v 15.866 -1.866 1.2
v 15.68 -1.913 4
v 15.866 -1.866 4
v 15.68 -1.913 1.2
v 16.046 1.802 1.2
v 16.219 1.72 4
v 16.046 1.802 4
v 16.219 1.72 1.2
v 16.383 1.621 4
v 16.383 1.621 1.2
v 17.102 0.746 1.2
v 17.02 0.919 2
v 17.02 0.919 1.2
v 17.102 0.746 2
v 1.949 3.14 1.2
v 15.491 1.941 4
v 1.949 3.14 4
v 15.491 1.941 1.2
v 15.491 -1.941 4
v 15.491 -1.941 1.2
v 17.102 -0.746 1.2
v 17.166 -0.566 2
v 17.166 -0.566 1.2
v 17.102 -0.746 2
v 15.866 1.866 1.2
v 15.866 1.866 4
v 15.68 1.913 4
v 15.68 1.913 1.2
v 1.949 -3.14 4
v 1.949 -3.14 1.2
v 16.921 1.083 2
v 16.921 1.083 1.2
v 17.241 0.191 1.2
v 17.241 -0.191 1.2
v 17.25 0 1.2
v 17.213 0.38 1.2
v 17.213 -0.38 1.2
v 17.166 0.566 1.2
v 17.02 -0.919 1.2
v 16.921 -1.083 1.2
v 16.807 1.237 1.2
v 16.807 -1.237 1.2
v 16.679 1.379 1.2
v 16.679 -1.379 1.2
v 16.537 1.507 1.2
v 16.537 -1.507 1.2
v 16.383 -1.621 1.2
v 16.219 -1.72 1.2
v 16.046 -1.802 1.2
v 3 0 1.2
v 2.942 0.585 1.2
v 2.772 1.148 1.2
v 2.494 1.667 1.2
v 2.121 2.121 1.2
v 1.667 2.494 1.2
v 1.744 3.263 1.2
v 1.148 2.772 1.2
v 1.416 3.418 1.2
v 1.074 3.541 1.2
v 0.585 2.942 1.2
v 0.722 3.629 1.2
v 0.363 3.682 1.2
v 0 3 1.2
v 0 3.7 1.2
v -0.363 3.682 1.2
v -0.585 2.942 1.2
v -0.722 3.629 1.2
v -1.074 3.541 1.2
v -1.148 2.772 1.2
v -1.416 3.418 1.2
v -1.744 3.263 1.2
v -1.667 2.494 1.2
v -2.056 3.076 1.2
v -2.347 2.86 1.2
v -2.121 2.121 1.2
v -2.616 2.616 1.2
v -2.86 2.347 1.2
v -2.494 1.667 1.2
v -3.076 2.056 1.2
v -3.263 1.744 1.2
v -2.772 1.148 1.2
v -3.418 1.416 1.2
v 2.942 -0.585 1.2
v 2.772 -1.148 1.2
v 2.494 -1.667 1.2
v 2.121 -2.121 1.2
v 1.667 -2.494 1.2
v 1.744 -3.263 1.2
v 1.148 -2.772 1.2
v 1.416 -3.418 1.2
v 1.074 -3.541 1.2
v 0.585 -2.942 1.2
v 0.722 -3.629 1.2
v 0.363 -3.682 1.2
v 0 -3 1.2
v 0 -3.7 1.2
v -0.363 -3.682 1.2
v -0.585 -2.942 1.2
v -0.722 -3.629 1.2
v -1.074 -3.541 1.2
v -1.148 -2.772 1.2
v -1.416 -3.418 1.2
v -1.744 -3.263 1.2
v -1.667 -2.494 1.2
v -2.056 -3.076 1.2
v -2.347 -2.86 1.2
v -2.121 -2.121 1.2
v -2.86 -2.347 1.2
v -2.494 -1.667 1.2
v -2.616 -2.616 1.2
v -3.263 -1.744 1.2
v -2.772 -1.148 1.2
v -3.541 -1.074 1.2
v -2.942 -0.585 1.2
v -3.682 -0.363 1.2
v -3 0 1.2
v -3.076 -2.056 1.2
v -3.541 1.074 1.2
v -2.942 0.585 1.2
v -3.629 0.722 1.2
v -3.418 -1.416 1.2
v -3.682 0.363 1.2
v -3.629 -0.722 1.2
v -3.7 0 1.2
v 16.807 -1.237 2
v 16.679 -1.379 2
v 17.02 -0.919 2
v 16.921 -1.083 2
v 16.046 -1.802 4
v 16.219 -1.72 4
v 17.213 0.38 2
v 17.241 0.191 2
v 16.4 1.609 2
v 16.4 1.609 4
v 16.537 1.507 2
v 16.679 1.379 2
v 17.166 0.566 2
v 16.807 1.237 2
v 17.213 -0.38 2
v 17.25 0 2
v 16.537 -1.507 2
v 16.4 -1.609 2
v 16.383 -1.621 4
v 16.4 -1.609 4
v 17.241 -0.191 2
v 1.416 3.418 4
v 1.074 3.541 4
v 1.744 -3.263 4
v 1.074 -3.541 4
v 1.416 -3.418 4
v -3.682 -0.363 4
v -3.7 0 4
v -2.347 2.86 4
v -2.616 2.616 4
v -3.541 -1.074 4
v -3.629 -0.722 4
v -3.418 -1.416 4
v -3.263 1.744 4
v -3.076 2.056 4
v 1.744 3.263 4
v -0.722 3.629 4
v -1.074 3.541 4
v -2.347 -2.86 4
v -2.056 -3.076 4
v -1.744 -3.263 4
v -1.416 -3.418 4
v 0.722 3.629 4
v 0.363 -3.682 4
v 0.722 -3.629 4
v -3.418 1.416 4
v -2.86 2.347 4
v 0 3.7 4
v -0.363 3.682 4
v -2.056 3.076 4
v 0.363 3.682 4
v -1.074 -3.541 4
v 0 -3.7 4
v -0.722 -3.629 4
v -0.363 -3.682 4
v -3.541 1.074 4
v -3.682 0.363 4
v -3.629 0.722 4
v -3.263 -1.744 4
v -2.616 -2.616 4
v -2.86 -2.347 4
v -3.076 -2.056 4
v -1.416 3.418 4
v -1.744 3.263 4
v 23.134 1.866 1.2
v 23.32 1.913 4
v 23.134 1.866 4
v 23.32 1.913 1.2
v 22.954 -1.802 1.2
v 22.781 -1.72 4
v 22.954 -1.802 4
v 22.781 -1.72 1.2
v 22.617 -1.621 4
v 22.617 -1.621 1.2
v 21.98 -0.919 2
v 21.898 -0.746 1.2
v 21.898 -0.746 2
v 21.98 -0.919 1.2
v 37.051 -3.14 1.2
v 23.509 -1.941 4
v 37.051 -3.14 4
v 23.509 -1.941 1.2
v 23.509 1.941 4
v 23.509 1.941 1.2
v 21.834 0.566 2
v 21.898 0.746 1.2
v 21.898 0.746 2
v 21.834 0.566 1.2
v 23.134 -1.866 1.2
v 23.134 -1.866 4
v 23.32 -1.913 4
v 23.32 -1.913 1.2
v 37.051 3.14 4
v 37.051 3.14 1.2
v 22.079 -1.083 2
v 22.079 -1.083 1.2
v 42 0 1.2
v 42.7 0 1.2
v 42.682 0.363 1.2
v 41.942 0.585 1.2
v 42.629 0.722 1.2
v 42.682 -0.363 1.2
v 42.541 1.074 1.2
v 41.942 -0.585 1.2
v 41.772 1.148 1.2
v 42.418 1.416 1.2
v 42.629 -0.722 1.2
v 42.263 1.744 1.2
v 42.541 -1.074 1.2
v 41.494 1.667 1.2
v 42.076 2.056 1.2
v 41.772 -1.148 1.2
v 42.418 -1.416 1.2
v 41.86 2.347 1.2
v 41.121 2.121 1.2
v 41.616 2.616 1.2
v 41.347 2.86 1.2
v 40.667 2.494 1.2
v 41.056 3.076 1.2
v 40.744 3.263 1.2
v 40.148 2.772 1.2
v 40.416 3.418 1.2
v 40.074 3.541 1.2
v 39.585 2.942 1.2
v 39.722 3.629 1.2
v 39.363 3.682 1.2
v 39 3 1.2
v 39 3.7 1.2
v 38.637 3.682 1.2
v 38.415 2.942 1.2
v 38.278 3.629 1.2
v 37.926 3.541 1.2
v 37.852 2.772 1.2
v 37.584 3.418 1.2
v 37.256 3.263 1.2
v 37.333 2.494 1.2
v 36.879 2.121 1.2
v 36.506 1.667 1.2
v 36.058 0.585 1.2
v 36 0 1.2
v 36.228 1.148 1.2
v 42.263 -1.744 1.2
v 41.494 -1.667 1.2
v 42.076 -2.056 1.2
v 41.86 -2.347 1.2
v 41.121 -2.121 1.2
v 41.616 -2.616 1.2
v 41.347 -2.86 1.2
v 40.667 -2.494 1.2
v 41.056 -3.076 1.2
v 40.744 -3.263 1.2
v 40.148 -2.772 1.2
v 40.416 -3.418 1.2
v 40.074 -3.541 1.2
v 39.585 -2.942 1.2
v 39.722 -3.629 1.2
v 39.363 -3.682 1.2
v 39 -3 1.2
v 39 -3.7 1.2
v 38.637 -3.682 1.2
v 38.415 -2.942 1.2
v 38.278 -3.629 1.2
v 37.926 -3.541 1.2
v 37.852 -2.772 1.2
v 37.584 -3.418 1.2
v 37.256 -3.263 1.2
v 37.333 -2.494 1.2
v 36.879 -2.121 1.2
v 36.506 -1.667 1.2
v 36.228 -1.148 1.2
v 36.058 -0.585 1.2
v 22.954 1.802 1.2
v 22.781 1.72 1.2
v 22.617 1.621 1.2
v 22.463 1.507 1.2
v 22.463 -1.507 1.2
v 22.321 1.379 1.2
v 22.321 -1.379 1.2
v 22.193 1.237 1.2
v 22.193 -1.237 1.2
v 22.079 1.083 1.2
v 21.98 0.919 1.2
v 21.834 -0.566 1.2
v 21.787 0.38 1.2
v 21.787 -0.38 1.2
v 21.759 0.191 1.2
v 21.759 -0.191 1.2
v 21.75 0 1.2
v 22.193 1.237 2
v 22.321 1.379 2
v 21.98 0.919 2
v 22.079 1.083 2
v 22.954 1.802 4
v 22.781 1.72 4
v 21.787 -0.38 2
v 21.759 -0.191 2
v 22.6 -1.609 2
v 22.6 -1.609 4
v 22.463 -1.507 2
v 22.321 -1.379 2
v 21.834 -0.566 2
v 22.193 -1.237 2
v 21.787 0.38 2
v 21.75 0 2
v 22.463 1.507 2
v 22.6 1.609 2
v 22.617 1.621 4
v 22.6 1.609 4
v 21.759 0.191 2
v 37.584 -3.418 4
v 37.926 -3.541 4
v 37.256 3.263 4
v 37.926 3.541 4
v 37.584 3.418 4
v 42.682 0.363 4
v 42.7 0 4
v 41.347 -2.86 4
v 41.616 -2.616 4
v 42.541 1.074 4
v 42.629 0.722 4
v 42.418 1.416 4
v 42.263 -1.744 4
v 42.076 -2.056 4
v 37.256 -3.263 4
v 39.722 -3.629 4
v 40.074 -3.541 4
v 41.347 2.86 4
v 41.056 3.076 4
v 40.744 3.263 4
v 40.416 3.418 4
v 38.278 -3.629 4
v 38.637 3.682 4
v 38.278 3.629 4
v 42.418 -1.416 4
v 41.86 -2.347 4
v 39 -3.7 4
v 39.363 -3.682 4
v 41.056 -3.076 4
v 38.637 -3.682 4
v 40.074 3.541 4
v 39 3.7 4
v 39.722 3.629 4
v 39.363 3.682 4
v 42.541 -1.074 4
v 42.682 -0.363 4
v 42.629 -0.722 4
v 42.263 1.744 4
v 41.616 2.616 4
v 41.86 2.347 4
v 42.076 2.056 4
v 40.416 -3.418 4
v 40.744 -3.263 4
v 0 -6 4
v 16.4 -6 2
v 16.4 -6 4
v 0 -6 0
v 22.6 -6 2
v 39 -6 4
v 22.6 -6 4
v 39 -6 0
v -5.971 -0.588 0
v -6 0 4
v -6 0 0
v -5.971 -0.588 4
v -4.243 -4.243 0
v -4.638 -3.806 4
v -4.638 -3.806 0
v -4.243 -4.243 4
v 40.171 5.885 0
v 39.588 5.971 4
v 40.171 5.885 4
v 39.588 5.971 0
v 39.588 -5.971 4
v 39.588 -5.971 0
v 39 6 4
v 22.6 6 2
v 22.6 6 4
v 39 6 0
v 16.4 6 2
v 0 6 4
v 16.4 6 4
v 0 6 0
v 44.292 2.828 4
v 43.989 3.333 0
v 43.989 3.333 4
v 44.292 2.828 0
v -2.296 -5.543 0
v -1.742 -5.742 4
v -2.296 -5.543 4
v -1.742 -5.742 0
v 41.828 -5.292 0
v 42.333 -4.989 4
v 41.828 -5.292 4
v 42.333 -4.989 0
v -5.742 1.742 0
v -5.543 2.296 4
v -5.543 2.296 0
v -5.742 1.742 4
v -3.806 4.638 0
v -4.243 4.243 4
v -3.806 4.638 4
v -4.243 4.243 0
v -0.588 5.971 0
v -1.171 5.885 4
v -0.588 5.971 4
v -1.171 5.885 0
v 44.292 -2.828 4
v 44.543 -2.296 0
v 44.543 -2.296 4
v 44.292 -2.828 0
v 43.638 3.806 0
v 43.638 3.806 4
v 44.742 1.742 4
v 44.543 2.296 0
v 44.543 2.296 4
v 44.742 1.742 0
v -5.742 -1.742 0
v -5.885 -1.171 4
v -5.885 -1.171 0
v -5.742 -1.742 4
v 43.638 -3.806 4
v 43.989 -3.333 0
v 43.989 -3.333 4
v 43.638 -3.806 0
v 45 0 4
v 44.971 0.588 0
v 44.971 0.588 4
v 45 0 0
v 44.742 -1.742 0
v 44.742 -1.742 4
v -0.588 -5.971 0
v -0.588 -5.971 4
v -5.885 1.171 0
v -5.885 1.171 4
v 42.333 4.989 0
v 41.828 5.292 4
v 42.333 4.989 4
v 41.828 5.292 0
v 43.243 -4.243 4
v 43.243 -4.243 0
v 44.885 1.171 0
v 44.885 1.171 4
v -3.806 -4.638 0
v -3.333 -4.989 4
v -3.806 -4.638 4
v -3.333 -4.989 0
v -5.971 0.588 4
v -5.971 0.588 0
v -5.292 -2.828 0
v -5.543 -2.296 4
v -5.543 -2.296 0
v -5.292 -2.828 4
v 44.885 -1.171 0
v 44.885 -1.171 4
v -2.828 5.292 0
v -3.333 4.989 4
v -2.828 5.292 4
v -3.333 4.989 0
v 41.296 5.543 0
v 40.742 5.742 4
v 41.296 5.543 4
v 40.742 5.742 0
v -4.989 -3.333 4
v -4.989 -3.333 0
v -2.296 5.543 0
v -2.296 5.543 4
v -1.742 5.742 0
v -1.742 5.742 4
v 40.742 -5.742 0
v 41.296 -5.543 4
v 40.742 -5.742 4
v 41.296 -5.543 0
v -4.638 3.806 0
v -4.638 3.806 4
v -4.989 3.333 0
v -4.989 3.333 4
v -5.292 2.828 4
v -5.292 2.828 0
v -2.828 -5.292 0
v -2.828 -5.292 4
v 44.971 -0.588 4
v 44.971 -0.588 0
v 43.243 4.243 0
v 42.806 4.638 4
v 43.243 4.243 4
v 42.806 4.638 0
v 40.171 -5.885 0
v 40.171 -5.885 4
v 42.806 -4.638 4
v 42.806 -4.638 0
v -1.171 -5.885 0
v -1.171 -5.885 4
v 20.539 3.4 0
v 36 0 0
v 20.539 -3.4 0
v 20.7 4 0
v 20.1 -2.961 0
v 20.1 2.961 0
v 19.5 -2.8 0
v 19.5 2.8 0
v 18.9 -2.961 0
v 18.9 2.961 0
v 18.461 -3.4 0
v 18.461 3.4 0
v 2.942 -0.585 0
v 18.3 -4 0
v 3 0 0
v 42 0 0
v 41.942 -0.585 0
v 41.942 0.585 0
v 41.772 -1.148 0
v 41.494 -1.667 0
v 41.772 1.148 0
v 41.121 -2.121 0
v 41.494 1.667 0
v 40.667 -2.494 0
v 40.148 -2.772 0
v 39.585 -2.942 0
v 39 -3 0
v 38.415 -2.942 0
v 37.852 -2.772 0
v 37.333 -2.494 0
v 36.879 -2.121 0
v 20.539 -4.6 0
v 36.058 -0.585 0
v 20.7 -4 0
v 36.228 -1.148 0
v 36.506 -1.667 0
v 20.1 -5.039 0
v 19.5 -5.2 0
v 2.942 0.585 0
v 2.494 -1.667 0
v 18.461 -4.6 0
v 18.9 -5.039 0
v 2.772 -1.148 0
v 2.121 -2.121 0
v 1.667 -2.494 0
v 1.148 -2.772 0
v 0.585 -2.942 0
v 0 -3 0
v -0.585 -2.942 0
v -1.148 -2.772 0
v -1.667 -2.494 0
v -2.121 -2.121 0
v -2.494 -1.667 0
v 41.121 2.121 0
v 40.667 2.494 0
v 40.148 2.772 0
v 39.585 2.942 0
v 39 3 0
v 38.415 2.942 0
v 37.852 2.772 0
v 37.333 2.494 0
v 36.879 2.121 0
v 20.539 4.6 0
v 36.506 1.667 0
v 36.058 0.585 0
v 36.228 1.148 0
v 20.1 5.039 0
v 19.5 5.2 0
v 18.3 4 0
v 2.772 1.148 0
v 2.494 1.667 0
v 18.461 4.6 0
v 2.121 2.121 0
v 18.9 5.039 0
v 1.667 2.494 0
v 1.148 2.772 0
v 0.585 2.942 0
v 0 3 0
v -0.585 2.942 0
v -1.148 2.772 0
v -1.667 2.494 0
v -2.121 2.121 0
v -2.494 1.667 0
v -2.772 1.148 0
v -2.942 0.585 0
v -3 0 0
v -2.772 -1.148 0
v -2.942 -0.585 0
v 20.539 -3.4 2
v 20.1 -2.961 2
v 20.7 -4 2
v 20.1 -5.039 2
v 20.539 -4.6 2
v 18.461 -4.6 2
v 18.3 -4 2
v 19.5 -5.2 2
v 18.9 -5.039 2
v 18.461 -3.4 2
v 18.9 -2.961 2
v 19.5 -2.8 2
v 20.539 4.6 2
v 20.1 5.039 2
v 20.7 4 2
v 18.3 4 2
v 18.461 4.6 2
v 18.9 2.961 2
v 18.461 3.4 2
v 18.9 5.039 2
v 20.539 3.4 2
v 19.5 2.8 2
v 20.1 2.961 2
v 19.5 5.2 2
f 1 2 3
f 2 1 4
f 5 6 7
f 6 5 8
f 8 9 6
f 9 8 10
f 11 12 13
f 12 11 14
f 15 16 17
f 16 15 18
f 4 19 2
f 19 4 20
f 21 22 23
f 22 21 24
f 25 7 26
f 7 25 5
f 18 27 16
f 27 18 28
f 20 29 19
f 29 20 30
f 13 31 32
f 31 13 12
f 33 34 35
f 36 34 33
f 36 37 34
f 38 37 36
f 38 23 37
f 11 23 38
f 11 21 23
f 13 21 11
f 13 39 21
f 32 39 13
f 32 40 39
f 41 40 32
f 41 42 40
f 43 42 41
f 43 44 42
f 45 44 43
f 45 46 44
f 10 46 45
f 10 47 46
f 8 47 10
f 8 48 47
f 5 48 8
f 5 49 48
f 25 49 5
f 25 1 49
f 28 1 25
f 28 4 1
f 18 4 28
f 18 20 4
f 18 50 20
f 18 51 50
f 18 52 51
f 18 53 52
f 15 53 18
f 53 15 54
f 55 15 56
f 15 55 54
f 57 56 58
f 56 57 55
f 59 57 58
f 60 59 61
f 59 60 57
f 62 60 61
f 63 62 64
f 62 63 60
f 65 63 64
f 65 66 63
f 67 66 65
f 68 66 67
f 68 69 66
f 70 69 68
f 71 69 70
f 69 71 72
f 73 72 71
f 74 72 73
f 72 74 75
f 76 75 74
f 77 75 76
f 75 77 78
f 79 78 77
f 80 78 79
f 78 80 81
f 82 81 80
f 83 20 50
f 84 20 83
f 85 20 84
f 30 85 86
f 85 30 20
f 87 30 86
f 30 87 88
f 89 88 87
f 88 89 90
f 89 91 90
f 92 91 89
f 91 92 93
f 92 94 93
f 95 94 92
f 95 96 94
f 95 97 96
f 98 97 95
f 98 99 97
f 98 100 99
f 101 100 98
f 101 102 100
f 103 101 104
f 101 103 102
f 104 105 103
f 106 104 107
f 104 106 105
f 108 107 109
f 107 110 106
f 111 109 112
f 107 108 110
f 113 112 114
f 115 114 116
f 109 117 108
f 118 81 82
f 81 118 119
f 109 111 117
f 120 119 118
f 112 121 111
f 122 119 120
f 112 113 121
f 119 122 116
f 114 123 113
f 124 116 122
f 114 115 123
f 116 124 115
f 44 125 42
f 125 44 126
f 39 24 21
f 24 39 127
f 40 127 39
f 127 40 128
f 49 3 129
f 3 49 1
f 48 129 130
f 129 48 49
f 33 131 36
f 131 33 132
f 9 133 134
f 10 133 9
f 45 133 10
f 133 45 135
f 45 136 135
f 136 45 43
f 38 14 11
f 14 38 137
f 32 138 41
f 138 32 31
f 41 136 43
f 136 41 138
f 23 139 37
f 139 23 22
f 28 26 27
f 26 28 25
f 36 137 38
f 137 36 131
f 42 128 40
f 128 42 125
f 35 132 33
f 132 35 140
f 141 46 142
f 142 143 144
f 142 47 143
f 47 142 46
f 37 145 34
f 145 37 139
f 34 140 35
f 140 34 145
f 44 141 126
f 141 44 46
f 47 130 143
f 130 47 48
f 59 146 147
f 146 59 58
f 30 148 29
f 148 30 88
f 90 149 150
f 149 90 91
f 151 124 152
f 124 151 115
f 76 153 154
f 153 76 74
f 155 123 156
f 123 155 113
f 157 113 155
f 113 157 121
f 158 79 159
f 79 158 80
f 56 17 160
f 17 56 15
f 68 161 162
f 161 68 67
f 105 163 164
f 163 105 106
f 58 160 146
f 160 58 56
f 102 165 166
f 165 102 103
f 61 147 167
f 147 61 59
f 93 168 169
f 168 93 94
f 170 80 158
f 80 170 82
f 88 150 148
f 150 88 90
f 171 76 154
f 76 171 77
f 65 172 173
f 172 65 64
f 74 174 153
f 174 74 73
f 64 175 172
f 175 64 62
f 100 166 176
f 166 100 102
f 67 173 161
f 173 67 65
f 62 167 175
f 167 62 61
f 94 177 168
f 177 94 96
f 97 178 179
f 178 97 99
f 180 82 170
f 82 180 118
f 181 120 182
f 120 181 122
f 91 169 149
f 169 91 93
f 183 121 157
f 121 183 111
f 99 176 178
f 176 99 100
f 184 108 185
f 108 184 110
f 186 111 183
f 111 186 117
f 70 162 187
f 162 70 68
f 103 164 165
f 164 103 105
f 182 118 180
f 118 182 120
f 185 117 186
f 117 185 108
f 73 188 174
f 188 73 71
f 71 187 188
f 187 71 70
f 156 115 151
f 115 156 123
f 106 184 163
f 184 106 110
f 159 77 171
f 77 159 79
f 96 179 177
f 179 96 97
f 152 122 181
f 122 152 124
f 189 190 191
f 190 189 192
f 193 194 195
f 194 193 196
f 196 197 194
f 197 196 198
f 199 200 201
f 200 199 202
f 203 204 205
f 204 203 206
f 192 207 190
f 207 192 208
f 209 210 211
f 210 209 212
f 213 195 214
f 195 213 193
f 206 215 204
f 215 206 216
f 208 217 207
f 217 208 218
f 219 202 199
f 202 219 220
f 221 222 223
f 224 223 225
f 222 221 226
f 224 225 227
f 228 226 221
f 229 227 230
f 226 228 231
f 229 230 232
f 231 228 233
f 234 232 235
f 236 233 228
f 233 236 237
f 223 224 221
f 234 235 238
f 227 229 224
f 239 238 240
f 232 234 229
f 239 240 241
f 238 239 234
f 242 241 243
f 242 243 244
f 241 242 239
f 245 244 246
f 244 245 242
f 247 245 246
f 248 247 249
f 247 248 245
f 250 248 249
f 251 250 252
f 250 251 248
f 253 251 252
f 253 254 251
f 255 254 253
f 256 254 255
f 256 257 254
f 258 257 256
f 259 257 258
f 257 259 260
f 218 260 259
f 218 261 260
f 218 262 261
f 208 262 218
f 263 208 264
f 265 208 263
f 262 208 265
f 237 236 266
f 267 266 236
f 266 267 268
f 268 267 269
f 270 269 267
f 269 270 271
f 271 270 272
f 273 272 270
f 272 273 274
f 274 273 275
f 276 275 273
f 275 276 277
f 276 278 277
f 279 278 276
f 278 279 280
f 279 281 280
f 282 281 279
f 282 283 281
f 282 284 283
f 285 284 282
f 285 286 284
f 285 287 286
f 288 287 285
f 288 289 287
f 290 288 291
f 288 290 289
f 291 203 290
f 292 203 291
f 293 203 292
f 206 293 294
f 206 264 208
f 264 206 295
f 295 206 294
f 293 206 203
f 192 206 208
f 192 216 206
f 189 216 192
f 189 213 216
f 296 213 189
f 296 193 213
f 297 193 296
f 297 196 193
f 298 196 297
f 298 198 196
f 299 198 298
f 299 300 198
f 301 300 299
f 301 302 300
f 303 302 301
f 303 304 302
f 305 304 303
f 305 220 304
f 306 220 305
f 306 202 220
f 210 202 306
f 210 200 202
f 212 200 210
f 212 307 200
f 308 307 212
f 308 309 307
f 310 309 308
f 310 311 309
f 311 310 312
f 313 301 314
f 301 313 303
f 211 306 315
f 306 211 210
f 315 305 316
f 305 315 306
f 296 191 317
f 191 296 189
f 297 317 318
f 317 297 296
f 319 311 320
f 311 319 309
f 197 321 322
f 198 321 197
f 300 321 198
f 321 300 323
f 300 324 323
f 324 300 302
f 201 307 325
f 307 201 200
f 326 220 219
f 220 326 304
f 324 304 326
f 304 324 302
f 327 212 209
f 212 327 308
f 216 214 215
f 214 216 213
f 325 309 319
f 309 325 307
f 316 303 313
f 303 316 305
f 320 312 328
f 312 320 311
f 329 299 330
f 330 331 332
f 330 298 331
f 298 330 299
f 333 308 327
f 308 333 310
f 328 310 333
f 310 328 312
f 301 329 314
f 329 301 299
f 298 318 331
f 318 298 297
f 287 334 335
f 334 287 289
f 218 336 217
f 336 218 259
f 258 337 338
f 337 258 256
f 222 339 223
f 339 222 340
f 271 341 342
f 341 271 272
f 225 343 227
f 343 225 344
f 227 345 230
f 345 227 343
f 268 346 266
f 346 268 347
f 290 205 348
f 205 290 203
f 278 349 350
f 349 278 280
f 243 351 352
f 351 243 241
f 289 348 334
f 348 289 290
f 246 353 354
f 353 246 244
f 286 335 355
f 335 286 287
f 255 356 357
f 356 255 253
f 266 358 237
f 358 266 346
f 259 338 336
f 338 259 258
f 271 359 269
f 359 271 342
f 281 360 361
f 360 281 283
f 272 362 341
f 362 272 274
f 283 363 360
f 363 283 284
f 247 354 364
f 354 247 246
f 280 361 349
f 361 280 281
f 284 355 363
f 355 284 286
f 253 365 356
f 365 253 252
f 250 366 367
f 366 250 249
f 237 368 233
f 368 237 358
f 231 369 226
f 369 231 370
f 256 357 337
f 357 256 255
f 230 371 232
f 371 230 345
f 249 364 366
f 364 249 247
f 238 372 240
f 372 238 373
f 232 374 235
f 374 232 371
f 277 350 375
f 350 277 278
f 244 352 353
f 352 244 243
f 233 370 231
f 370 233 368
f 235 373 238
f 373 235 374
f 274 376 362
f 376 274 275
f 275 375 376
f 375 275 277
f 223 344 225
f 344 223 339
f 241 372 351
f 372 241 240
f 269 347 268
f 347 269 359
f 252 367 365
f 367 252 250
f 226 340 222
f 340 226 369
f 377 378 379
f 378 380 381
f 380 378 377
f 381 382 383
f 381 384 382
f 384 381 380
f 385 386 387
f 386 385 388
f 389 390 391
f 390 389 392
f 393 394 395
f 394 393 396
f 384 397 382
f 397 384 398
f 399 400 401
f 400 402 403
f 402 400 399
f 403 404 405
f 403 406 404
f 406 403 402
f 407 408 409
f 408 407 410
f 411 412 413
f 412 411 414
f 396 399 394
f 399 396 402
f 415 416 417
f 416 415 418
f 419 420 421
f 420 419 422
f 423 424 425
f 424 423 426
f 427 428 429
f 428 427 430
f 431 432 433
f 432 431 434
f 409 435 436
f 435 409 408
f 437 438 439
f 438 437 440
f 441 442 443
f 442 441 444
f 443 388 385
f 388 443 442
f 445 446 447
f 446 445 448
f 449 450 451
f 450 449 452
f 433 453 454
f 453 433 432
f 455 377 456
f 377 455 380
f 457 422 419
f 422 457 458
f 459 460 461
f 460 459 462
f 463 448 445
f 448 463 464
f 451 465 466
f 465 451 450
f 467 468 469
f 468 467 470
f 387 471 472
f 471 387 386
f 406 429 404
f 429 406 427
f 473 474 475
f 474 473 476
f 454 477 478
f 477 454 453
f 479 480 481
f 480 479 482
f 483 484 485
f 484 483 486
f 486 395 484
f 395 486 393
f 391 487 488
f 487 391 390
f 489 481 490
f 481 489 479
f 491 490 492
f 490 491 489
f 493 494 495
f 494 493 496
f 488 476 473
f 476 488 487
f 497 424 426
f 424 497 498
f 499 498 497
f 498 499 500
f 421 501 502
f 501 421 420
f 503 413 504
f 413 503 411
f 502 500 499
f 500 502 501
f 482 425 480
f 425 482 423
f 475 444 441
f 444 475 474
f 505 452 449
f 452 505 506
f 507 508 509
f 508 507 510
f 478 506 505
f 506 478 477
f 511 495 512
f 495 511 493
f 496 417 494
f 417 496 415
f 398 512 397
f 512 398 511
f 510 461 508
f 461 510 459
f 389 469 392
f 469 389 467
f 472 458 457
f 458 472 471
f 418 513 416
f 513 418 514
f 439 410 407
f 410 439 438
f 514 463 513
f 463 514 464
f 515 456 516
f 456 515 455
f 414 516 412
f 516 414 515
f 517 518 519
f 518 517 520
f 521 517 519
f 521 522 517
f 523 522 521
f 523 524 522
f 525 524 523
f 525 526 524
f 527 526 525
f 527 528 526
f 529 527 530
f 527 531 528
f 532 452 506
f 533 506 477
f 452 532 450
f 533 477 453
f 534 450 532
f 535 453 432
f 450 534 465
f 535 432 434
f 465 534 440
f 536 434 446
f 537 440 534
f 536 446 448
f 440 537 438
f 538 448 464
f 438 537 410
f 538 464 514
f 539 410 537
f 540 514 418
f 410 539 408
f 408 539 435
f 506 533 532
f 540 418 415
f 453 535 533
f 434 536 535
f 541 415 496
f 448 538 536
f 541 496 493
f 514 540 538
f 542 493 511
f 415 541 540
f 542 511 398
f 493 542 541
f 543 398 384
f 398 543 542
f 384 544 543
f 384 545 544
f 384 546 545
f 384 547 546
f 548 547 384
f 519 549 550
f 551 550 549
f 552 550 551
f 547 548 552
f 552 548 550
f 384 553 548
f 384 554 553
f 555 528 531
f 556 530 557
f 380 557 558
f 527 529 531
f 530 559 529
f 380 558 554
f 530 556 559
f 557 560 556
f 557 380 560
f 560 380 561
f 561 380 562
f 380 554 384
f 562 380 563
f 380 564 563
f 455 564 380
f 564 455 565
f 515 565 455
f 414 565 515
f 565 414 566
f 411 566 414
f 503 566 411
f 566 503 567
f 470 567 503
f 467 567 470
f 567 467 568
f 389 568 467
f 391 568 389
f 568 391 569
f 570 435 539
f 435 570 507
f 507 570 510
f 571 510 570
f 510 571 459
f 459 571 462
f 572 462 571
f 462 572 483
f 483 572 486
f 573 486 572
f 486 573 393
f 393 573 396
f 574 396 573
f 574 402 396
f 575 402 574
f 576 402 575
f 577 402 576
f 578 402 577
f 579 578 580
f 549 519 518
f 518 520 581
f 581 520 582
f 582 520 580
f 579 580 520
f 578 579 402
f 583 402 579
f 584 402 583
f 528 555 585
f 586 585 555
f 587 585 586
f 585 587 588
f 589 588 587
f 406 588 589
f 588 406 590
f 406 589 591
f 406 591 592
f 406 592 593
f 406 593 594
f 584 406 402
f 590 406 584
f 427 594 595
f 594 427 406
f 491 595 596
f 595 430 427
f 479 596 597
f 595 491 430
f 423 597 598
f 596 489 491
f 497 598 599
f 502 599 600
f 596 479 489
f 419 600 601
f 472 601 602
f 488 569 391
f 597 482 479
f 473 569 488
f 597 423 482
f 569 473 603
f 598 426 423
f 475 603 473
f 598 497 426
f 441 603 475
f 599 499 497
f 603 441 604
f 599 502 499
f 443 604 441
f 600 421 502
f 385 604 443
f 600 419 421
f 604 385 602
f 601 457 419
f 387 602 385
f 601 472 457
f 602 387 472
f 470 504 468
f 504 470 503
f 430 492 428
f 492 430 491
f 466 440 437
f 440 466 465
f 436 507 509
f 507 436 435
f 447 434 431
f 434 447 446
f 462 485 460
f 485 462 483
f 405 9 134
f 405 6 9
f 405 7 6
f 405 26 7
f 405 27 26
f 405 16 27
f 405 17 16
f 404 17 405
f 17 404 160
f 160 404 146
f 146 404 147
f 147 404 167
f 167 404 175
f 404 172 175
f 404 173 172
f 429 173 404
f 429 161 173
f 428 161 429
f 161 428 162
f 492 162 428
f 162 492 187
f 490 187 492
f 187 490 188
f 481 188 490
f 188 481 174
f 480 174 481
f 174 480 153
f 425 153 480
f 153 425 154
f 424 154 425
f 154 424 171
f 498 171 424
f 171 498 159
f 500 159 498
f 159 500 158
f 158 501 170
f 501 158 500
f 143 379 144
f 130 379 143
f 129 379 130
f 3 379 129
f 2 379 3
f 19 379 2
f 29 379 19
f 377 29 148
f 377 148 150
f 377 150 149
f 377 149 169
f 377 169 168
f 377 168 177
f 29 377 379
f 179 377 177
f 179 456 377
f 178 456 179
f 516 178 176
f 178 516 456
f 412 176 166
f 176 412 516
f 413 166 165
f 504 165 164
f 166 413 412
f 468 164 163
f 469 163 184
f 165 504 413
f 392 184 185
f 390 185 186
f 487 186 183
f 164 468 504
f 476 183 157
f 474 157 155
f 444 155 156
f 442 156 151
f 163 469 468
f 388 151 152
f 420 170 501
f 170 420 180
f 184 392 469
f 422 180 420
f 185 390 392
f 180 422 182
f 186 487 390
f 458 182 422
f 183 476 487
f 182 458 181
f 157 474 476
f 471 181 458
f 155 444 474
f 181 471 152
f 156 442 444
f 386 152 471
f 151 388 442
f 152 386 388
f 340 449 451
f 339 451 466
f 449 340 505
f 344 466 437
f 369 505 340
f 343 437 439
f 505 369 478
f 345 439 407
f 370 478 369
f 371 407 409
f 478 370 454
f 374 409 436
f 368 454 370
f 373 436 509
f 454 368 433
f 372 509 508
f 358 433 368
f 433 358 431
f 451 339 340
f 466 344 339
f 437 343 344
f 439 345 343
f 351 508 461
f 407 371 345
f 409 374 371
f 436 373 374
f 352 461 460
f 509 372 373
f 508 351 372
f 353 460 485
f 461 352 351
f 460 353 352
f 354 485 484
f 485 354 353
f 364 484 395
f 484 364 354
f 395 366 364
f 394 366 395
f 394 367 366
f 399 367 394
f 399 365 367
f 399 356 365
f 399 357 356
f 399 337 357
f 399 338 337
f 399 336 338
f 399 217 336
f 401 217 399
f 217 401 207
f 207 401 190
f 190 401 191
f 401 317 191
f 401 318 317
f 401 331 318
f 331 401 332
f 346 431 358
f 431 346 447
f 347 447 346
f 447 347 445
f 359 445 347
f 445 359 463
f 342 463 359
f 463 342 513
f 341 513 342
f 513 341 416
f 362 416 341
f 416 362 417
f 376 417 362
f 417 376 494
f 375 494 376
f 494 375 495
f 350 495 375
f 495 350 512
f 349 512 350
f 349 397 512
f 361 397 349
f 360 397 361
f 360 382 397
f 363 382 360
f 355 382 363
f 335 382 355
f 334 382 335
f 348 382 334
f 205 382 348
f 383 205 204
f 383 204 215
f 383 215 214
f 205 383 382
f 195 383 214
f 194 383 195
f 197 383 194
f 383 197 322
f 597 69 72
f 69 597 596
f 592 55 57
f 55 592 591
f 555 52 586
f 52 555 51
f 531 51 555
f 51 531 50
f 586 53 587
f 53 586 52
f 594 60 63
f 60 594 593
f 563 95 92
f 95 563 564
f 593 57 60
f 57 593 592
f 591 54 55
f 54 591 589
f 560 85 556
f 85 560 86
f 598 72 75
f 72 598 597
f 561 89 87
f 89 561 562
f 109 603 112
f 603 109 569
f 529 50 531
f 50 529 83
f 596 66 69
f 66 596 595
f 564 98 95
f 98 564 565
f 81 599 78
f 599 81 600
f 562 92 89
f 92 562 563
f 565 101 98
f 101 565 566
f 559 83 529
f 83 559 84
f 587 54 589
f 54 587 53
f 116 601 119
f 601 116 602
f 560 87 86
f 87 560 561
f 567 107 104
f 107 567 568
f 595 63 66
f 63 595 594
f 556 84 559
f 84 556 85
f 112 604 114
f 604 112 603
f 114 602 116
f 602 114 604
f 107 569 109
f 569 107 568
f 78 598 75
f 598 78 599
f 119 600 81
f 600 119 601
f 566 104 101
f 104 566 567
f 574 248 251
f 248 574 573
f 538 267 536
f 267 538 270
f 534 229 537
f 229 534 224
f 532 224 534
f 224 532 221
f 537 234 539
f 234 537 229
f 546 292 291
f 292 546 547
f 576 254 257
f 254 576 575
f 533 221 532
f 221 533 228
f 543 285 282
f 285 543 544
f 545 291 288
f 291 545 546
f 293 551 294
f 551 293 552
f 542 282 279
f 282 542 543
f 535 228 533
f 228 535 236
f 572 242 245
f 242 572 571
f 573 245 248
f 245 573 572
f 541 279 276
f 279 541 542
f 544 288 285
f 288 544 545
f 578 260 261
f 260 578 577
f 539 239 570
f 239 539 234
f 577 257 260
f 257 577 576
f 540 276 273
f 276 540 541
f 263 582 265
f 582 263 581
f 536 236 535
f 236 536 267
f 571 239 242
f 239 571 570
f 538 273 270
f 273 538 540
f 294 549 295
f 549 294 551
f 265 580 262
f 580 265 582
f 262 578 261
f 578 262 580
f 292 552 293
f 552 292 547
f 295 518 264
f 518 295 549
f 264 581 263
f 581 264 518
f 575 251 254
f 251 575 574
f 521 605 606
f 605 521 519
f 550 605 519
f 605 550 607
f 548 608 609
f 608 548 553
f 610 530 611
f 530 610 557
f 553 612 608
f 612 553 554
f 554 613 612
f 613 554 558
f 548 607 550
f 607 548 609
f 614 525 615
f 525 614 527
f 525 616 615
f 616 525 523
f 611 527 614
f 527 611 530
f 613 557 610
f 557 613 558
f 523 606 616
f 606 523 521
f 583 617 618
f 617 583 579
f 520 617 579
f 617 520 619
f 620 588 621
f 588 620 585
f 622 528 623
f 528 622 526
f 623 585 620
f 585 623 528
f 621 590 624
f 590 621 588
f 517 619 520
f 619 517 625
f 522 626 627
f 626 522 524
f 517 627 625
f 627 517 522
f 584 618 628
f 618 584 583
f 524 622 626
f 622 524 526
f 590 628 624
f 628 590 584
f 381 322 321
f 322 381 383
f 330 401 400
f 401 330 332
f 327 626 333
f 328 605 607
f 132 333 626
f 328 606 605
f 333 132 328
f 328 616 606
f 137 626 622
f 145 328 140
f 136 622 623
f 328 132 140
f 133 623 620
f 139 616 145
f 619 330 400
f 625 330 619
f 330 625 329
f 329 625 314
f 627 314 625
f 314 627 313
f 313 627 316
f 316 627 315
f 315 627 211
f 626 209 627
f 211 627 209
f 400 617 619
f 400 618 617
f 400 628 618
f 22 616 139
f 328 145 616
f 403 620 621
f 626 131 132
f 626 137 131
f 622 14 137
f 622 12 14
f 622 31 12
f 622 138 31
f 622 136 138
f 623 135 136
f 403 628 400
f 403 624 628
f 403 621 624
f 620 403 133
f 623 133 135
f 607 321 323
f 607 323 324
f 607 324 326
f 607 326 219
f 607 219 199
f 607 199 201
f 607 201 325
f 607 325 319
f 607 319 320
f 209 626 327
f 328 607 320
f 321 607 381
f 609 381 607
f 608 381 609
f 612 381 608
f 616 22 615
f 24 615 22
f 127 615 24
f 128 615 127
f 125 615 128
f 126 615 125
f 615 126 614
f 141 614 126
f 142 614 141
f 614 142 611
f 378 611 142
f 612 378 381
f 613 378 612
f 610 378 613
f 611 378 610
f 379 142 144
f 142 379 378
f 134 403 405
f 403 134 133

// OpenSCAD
// file: horn1.scad
$fn = 64;

horn_r     = 7.4/2;
horn_r2    = 6.6/2;
horn_h     = 4;

center_to_tip_center = 19 - horn_r;

horn_thick = 4;
horn_tip   = 3.9/2;

horn1();

module horn1() {
    hull() {
        cylinder(r=horn_r2, h=horn_thick);
        translate([center_to_tip_center, 0,0])
        cylinder(r=horn_tip, h = horn_thick);
    }
    cylinder(r=horn_r,h=horn_h);
}
// main file
use<horn1.scad>

mount_y = 12;
mount_x = 51-mount_y;

thick   = 4;

difference() {
    union() {
        hull() {
            cylinder(r=mount_y/2, h=thick,$fn = 64);
            translate([mount_x,0,0])
            cylinder(r=mount_y/2, h=thick,$fn = 64);
        }
    }
    translate([0,0,1.2])
    horn1();
    translate([0,0,-.1])
    cylinder(r=3,h=5, $fn = 32);
    
    translate([mount_x,0,1.2])
    rotate([0,0,180])
    horn1();
    translate([mount_x,0,-.1])
    cylinder(r=3,h=5, $fn = 32);
    
    
    translate([mount_x/2,-4,-.1])
    cylinder(r=1.2, h=15, $fn=12);
    translate([mount_x/2,4,-.1])
    cylinder(r=1.2, h=15, $fn=12);
    
    translate([mount_x/2-3.1, -mount_y/2-.1,2])
    cube([6.2,mount_y+.2,8]);
}
